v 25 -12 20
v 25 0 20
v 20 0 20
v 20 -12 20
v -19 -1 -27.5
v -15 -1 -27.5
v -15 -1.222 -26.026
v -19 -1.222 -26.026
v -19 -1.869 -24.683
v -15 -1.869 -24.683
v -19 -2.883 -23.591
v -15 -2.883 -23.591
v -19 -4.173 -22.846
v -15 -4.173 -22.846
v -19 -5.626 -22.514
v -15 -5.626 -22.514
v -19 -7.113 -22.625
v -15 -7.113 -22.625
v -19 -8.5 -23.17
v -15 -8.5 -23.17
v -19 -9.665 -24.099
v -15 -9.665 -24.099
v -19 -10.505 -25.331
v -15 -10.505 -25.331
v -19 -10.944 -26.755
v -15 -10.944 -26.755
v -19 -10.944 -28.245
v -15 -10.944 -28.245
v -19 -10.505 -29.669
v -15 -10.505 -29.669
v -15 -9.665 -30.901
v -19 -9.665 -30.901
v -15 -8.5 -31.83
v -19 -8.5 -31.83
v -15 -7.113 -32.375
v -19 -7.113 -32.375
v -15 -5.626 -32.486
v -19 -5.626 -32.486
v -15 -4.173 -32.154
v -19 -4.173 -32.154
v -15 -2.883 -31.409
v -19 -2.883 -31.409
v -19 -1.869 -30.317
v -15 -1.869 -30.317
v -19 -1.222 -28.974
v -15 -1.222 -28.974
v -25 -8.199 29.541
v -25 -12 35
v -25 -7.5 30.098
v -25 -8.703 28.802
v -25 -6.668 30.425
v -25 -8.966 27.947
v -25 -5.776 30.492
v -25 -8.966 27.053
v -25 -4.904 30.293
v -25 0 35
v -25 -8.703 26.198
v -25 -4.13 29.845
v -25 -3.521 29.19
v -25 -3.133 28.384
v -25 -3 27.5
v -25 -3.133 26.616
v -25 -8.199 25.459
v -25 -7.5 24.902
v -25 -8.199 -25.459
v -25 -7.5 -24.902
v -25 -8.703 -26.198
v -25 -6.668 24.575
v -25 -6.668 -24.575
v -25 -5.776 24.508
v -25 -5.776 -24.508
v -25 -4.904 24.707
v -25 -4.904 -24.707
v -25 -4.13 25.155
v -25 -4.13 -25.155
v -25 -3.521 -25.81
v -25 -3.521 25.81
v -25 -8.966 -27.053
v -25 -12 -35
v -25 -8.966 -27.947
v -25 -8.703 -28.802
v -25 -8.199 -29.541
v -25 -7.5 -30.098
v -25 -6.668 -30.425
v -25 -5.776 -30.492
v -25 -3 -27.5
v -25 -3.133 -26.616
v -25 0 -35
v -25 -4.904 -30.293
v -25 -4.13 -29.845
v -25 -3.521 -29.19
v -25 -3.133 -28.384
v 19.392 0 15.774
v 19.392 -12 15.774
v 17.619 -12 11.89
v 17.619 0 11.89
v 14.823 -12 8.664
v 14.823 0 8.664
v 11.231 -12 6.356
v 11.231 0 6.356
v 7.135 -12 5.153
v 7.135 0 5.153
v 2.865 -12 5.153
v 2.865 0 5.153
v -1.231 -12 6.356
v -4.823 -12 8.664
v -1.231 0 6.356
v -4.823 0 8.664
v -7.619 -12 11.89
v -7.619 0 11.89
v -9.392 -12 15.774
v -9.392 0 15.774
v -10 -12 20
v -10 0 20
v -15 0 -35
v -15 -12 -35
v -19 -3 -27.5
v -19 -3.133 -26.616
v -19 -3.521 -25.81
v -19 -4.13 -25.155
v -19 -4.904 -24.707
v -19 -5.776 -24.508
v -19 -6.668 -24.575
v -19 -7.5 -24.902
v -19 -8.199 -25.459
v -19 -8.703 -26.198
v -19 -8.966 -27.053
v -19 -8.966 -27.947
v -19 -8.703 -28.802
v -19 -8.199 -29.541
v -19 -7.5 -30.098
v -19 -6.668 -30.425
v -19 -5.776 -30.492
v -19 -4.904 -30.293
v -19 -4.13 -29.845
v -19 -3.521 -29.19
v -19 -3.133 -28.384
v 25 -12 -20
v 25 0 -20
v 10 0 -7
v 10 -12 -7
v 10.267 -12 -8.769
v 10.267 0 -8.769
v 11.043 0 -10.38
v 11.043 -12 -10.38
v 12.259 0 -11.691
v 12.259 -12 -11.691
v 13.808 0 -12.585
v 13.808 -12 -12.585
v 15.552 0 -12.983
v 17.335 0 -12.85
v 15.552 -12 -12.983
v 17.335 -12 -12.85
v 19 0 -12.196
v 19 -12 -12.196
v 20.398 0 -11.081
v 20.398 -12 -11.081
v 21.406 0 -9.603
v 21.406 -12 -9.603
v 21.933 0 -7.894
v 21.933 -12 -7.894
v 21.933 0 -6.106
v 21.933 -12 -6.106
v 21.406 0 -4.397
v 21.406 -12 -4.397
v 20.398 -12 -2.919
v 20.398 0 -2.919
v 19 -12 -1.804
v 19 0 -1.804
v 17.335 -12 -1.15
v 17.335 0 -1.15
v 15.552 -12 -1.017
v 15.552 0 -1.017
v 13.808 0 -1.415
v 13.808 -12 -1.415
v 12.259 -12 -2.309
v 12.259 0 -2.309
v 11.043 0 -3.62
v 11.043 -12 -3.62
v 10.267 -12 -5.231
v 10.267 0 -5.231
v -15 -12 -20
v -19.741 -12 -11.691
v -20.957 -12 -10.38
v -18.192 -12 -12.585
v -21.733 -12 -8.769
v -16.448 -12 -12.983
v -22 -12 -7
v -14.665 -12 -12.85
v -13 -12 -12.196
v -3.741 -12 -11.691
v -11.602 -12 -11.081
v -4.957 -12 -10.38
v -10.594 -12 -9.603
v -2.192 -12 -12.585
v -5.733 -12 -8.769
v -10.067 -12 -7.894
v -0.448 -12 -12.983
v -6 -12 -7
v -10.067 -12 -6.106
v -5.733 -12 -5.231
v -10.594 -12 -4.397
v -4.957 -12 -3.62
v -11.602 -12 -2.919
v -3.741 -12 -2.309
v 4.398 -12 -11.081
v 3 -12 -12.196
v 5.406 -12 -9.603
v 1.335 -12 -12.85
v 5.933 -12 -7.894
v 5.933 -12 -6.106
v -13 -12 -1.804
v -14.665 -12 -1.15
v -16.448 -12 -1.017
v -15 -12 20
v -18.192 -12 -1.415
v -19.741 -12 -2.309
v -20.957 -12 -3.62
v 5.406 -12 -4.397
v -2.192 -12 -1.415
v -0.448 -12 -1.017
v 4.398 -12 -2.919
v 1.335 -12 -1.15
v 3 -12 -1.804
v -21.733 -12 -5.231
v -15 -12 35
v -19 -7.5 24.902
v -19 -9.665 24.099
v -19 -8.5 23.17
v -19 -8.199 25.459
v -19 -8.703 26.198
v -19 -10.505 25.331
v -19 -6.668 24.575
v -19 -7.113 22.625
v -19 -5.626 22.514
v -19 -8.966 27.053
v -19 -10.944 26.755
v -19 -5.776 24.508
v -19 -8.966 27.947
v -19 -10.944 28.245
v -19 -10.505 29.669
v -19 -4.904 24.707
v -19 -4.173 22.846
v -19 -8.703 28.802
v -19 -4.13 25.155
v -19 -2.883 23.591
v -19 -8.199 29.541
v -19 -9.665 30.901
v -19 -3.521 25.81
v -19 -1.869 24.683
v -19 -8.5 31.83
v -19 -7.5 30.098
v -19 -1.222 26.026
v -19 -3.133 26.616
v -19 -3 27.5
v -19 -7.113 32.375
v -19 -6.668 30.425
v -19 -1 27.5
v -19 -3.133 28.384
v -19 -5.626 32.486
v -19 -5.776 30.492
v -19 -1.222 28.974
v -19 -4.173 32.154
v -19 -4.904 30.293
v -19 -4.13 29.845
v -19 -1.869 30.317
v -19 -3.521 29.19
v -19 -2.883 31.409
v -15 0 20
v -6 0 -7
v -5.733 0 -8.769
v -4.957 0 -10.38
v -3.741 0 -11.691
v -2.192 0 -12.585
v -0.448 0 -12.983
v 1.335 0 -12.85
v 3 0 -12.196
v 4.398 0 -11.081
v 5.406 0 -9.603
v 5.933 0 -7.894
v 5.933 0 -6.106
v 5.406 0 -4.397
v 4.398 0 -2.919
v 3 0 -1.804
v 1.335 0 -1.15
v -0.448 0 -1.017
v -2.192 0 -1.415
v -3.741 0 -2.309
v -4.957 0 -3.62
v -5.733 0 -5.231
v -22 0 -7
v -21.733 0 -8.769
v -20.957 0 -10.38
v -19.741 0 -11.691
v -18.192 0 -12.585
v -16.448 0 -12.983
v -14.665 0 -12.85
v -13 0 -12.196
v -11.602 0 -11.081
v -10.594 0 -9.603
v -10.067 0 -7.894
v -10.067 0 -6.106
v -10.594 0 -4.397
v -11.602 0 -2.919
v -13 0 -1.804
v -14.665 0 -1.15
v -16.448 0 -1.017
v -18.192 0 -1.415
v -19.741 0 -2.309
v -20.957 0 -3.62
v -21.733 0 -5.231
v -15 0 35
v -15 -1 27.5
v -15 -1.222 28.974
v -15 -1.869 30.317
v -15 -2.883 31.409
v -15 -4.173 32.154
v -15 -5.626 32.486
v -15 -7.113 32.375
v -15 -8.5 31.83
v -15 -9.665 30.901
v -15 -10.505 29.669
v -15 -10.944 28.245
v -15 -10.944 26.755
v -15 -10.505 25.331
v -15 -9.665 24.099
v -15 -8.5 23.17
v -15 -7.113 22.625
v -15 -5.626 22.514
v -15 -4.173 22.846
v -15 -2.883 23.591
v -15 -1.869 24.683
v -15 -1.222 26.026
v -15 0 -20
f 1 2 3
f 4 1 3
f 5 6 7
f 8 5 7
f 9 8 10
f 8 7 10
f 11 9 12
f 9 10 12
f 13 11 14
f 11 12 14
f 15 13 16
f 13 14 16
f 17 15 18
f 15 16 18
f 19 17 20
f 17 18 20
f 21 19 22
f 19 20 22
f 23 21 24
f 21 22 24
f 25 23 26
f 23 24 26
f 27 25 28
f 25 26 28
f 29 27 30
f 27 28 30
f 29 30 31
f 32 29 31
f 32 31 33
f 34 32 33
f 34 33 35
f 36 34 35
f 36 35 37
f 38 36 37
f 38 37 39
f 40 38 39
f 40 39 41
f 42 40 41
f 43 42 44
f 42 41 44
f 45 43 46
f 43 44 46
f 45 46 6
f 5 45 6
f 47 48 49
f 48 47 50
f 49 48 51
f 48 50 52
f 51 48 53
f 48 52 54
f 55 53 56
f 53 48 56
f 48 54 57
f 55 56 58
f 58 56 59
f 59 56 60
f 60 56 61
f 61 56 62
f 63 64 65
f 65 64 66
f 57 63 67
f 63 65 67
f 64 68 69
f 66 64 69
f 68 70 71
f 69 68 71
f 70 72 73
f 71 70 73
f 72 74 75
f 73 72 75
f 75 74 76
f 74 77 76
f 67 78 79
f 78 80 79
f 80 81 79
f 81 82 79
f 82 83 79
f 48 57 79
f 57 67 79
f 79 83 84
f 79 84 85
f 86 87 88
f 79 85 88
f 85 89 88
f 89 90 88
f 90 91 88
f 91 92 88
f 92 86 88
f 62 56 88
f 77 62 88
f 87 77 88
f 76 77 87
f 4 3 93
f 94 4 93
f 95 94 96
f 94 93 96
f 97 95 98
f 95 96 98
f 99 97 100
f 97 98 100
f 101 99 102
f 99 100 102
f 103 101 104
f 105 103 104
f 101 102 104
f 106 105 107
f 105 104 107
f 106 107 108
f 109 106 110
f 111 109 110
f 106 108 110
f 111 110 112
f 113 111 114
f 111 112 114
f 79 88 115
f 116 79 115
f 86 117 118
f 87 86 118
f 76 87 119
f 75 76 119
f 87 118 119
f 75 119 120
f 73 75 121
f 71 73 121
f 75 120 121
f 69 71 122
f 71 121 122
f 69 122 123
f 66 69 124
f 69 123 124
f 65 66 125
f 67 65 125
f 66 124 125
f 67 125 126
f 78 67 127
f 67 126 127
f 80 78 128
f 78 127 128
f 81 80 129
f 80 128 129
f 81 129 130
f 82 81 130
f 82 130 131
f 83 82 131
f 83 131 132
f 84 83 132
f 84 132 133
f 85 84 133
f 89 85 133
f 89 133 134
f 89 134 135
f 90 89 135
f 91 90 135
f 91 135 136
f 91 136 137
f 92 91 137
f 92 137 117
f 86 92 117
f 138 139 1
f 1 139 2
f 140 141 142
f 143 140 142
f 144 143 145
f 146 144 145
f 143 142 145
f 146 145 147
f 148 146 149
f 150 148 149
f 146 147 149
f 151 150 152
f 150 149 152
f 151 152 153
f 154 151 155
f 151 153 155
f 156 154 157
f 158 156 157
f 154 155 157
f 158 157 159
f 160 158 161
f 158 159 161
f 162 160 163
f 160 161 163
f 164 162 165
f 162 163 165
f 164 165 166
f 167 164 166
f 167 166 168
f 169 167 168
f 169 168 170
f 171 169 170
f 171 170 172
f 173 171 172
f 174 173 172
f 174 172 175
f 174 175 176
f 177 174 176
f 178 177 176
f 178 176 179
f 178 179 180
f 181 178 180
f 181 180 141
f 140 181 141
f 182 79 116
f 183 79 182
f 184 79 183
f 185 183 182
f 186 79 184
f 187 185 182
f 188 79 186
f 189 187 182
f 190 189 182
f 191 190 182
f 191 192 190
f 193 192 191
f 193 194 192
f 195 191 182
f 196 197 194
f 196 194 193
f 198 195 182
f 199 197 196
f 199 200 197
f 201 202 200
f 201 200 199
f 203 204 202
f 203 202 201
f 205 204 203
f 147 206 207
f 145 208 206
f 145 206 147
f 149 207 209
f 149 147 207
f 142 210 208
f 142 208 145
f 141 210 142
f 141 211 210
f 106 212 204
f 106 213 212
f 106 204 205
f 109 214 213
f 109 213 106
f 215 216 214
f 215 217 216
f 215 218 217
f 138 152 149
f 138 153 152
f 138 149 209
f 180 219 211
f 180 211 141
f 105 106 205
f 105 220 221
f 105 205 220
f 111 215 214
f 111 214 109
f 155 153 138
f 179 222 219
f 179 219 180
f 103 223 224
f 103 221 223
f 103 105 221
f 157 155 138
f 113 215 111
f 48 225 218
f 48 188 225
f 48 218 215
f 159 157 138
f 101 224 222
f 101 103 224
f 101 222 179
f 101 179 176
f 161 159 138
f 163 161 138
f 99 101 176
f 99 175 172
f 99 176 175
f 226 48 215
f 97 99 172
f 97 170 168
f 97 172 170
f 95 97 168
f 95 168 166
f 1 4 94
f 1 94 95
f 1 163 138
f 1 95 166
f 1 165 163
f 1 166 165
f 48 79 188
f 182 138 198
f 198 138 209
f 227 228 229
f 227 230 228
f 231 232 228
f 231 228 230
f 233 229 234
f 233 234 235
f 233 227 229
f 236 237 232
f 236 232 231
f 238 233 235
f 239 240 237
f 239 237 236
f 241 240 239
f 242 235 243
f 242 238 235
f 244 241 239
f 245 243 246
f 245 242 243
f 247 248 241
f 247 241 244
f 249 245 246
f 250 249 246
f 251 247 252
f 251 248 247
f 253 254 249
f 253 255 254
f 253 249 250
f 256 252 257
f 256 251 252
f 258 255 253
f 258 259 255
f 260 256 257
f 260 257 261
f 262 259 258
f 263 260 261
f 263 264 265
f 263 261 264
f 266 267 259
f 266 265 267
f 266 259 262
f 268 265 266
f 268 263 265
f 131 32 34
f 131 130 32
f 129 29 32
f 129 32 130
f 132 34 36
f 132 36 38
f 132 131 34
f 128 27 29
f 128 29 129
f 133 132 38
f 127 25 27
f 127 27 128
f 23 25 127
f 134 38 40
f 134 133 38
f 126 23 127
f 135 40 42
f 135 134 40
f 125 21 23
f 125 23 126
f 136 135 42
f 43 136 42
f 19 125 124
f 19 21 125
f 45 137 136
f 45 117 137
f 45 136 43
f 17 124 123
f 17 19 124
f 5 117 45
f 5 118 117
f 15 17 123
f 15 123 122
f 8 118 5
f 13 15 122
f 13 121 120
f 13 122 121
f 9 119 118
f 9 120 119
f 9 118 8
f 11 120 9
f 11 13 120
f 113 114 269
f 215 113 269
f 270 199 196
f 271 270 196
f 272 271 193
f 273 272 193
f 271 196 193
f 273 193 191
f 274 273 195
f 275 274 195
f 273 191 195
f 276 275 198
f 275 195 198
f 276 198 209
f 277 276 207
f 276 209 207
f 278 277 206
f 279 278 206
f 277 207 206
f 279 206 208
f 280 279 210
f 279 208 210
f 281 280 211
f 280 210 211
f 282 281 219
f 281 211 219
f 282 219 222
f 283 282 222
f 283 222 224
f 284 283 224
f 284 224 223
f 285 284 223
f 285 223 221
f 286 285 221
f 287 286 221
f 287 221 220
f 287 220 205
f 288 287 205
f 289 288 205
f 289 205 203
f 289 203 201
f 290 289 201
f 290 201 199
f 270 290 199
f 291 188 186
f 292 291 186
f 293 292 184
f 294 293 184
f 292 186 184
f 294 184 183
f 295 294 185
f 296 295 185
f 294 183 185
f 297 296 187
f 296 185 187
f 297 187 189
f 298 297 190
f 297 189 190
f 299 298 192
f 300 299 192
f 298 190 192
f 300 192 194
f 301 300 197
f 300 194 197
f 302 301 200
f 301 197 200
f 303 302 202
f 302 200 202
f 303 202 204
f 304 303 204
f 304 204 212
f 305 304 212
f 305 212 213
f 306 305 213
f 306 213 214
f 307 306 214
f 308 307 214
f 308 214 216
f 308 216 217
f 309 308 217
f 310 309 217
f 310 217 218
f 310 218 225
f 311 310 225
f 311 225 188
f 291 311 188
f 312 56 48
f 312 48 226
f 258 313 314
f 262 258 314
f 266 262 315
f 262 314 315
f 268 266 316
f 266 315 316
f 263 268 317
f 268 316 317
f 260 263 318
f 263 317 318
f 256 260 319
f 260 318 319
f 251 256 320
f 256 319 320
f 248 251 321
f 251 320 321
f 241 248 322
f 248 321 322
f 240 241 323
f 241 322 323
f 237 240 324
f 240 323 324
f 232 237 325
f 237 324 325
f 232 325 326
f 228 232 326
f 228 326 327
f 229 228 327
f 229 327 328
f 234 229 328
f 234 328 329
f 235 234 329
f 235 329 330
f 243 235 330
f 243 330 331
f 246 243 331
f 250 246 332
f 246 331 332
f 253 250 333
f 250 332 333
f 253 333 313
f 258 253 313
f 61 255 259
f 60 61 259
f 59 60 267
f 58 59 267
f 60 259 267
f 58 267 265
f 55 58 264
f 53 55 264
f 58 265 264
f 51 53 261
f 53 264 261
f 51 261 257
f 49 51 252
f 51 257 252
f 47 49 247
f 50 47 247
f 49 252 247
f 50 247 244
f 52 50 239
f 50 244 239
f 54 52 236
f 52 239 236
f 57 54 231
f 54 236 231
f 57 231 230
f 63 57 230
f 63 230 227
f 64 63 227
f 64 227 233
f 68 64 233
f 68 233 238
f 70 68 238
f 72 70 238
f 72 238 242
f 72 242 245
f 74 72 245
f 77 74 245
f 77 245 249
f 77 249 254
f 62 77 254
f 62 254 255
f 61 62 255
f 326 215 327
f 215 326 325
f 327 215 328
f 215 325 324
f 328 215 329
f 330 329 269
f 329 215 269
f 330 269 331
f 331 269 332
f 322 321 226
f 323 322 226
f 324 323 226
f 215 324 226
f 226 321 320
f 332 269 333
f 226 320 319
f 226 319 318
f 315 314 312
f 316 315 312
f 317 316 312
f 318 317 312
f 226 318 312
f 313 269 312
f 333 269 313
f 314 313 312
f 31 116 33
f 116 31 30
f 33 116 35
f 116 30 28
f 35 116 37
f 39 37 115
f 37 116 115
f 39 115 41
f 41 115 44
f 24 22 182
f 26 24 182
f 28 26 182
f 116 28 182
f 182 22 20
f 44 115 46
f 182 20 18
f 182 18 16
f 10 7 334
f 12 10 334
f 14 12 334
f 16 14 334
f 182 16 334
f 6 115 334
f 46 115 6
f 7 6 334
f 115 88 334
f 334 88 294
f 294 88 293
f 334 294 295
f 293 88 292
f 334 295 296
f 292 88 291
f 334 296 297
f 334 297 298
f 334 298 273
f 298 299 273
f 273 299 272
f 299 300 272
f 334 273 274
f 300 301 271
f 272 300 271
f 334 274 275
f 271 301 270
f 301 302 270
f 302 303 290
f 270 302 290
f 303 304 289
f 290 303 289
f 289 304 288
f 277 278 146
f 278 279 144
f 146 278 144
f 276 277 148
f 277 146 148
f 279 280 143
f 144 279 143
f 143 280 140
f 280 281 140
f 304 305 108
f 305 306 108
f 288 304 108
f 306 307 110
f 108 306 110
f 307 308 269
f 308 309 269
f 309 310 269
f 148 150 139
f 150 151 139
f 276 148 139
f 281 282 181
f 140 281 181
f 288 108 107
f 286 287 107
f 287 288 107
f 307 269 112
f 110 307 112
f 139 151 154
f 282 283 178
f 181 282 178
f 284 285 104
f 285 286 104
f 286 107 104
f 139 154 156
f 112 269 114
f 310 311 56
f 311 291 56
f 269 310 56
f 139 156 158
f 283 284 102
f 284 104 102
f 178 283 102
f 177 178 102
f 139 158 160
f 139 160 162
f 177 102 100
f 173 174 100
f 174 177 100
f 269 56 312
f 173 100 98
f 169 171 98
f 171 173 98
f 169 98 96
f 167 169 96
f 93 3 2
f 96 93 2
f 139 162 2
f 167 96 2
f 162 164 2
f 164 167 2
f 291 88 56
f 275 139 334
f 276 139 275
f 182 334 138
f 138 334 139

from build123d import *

# Parameters (mm, degrees)
F0_W      = 10
F0_H      = 15
F0_H_2    = 40
F1_DEPTH  = 12
F2_R      = 3
F3_DEPTH  = 10.001
F4_R      = 5
F4_R_2    = 3
F5_DEPTH  = 4
F6_R      = 3
F7_DEPTH  = 10.001
F8_R      = 5
F8_R_2    = 3
F9_DEPTH  = 4
F11_DEPTH = 12.001


with BuildPart() as f1:
    # F0 (on Front) → F1 (new body)
    with BuildSketch(Plane.XZ):
        with Locations((-20, 27.5)):
            Rectangle(F0_W, F0_H)
        with Locations((-20, 0)):
            Rectangle(F0_W, F0_H_2)
        with Locations((-20, -27.5)):
            Rectangle(F0_W, F0_H)
        with BuildLine():
            Line((-15, -20), (25, -20))
            Line((25, -20), (25, 20))
            Line((25, 20), (20, 20))
            ThreePointArc((20, 20), (5, 5), (-10, 20))
            Line((-10, 20), (-15, 20))
            Line((-15, 20), (-15, -20))
        make_face()
    extrude(amount=F1_DEPTH)

    # F2 (on face) → F3 (cut, through all)
    with BuildSketch(Plane.YZ.offset(-15)):
        with Locations((-6, 27.5)):
            Circle(F2_R)
    extrude(amount=-F3_DEPTH, mode=Mode.SUBTRACT)

    # F4 (on face) → F5 (cut)
    with BuildSketch(Plane.YZ.offset(-15)):
        with Locations((-6, 27.5)):
            Circle(F4_R)
        with Locations((-6, 27.5)):
            Circle(F4_R_2, mode=Mode.SUBTRACT)
    extrude(amount=-F5_DEPTH, mode=Mode.SUBTRACT)

    # F6 (on face) → F7 (cut, through all)
    with BuildSketch(Plane.YZ.offset(-15)):
        with Locations((-6, -27.5)):
            Circle(F6_R)
    extrude(amount=-F7_DEPTH, mode=Mode.SUBTRACT)

    # F8 (on face) → F9 (cut)
    with BuildSketch(Plane.YZ.offset(-15)):
        with Locations((-6, -27.5)):
            Circle(F8_R)
        with Locations((-6, -27.5)):
            Circle(F8_R_2, mode=Mode.SUBTRACT)
    extrude(amount=-F9_DEPTH, mode=Mode.SUBTRACT)

    # F10 (on face) → F11 (cut, through all)
    with BuildSketch(Plane.XZ.offset(12)):
        with BuildLine():
            Line((-22, -7), (-10, -7))
            ThreePointArc((-10, -7), (-16, -1), (-22, -7))
        make_face()
        with BuildLine():
            ThreePointArc((-22, -7), (-16, -13), (-10, -7))
            Line((-10, -7), (-22, -7))
        make_face()
        with BuildLine():
            Line((-6, -7), (6, -7))
            ThreePointArc((6, -7), (0, -1), (-6, -7))
        make_face()
        with BuildLine():
            ThreePointArc((-6, -7), (0, -13), (6, -7))
            Line((6, -7), (-6, -7))
        make_face()
        with BuildLine():
            Line((10, -7), (22, -7))
            ThreePointArc((22, -7), (16, -1), (10, -7))
        make_face()
        with BuildLine():
            ThreePointArc((10, -7), (16, -13), (22, -7))
            Line((22, -7), (10, -7))
        make_face()
    extrude(amount=-F11_DEPTH, mode=Mode.SUBTRACT)


solid = f1.part
